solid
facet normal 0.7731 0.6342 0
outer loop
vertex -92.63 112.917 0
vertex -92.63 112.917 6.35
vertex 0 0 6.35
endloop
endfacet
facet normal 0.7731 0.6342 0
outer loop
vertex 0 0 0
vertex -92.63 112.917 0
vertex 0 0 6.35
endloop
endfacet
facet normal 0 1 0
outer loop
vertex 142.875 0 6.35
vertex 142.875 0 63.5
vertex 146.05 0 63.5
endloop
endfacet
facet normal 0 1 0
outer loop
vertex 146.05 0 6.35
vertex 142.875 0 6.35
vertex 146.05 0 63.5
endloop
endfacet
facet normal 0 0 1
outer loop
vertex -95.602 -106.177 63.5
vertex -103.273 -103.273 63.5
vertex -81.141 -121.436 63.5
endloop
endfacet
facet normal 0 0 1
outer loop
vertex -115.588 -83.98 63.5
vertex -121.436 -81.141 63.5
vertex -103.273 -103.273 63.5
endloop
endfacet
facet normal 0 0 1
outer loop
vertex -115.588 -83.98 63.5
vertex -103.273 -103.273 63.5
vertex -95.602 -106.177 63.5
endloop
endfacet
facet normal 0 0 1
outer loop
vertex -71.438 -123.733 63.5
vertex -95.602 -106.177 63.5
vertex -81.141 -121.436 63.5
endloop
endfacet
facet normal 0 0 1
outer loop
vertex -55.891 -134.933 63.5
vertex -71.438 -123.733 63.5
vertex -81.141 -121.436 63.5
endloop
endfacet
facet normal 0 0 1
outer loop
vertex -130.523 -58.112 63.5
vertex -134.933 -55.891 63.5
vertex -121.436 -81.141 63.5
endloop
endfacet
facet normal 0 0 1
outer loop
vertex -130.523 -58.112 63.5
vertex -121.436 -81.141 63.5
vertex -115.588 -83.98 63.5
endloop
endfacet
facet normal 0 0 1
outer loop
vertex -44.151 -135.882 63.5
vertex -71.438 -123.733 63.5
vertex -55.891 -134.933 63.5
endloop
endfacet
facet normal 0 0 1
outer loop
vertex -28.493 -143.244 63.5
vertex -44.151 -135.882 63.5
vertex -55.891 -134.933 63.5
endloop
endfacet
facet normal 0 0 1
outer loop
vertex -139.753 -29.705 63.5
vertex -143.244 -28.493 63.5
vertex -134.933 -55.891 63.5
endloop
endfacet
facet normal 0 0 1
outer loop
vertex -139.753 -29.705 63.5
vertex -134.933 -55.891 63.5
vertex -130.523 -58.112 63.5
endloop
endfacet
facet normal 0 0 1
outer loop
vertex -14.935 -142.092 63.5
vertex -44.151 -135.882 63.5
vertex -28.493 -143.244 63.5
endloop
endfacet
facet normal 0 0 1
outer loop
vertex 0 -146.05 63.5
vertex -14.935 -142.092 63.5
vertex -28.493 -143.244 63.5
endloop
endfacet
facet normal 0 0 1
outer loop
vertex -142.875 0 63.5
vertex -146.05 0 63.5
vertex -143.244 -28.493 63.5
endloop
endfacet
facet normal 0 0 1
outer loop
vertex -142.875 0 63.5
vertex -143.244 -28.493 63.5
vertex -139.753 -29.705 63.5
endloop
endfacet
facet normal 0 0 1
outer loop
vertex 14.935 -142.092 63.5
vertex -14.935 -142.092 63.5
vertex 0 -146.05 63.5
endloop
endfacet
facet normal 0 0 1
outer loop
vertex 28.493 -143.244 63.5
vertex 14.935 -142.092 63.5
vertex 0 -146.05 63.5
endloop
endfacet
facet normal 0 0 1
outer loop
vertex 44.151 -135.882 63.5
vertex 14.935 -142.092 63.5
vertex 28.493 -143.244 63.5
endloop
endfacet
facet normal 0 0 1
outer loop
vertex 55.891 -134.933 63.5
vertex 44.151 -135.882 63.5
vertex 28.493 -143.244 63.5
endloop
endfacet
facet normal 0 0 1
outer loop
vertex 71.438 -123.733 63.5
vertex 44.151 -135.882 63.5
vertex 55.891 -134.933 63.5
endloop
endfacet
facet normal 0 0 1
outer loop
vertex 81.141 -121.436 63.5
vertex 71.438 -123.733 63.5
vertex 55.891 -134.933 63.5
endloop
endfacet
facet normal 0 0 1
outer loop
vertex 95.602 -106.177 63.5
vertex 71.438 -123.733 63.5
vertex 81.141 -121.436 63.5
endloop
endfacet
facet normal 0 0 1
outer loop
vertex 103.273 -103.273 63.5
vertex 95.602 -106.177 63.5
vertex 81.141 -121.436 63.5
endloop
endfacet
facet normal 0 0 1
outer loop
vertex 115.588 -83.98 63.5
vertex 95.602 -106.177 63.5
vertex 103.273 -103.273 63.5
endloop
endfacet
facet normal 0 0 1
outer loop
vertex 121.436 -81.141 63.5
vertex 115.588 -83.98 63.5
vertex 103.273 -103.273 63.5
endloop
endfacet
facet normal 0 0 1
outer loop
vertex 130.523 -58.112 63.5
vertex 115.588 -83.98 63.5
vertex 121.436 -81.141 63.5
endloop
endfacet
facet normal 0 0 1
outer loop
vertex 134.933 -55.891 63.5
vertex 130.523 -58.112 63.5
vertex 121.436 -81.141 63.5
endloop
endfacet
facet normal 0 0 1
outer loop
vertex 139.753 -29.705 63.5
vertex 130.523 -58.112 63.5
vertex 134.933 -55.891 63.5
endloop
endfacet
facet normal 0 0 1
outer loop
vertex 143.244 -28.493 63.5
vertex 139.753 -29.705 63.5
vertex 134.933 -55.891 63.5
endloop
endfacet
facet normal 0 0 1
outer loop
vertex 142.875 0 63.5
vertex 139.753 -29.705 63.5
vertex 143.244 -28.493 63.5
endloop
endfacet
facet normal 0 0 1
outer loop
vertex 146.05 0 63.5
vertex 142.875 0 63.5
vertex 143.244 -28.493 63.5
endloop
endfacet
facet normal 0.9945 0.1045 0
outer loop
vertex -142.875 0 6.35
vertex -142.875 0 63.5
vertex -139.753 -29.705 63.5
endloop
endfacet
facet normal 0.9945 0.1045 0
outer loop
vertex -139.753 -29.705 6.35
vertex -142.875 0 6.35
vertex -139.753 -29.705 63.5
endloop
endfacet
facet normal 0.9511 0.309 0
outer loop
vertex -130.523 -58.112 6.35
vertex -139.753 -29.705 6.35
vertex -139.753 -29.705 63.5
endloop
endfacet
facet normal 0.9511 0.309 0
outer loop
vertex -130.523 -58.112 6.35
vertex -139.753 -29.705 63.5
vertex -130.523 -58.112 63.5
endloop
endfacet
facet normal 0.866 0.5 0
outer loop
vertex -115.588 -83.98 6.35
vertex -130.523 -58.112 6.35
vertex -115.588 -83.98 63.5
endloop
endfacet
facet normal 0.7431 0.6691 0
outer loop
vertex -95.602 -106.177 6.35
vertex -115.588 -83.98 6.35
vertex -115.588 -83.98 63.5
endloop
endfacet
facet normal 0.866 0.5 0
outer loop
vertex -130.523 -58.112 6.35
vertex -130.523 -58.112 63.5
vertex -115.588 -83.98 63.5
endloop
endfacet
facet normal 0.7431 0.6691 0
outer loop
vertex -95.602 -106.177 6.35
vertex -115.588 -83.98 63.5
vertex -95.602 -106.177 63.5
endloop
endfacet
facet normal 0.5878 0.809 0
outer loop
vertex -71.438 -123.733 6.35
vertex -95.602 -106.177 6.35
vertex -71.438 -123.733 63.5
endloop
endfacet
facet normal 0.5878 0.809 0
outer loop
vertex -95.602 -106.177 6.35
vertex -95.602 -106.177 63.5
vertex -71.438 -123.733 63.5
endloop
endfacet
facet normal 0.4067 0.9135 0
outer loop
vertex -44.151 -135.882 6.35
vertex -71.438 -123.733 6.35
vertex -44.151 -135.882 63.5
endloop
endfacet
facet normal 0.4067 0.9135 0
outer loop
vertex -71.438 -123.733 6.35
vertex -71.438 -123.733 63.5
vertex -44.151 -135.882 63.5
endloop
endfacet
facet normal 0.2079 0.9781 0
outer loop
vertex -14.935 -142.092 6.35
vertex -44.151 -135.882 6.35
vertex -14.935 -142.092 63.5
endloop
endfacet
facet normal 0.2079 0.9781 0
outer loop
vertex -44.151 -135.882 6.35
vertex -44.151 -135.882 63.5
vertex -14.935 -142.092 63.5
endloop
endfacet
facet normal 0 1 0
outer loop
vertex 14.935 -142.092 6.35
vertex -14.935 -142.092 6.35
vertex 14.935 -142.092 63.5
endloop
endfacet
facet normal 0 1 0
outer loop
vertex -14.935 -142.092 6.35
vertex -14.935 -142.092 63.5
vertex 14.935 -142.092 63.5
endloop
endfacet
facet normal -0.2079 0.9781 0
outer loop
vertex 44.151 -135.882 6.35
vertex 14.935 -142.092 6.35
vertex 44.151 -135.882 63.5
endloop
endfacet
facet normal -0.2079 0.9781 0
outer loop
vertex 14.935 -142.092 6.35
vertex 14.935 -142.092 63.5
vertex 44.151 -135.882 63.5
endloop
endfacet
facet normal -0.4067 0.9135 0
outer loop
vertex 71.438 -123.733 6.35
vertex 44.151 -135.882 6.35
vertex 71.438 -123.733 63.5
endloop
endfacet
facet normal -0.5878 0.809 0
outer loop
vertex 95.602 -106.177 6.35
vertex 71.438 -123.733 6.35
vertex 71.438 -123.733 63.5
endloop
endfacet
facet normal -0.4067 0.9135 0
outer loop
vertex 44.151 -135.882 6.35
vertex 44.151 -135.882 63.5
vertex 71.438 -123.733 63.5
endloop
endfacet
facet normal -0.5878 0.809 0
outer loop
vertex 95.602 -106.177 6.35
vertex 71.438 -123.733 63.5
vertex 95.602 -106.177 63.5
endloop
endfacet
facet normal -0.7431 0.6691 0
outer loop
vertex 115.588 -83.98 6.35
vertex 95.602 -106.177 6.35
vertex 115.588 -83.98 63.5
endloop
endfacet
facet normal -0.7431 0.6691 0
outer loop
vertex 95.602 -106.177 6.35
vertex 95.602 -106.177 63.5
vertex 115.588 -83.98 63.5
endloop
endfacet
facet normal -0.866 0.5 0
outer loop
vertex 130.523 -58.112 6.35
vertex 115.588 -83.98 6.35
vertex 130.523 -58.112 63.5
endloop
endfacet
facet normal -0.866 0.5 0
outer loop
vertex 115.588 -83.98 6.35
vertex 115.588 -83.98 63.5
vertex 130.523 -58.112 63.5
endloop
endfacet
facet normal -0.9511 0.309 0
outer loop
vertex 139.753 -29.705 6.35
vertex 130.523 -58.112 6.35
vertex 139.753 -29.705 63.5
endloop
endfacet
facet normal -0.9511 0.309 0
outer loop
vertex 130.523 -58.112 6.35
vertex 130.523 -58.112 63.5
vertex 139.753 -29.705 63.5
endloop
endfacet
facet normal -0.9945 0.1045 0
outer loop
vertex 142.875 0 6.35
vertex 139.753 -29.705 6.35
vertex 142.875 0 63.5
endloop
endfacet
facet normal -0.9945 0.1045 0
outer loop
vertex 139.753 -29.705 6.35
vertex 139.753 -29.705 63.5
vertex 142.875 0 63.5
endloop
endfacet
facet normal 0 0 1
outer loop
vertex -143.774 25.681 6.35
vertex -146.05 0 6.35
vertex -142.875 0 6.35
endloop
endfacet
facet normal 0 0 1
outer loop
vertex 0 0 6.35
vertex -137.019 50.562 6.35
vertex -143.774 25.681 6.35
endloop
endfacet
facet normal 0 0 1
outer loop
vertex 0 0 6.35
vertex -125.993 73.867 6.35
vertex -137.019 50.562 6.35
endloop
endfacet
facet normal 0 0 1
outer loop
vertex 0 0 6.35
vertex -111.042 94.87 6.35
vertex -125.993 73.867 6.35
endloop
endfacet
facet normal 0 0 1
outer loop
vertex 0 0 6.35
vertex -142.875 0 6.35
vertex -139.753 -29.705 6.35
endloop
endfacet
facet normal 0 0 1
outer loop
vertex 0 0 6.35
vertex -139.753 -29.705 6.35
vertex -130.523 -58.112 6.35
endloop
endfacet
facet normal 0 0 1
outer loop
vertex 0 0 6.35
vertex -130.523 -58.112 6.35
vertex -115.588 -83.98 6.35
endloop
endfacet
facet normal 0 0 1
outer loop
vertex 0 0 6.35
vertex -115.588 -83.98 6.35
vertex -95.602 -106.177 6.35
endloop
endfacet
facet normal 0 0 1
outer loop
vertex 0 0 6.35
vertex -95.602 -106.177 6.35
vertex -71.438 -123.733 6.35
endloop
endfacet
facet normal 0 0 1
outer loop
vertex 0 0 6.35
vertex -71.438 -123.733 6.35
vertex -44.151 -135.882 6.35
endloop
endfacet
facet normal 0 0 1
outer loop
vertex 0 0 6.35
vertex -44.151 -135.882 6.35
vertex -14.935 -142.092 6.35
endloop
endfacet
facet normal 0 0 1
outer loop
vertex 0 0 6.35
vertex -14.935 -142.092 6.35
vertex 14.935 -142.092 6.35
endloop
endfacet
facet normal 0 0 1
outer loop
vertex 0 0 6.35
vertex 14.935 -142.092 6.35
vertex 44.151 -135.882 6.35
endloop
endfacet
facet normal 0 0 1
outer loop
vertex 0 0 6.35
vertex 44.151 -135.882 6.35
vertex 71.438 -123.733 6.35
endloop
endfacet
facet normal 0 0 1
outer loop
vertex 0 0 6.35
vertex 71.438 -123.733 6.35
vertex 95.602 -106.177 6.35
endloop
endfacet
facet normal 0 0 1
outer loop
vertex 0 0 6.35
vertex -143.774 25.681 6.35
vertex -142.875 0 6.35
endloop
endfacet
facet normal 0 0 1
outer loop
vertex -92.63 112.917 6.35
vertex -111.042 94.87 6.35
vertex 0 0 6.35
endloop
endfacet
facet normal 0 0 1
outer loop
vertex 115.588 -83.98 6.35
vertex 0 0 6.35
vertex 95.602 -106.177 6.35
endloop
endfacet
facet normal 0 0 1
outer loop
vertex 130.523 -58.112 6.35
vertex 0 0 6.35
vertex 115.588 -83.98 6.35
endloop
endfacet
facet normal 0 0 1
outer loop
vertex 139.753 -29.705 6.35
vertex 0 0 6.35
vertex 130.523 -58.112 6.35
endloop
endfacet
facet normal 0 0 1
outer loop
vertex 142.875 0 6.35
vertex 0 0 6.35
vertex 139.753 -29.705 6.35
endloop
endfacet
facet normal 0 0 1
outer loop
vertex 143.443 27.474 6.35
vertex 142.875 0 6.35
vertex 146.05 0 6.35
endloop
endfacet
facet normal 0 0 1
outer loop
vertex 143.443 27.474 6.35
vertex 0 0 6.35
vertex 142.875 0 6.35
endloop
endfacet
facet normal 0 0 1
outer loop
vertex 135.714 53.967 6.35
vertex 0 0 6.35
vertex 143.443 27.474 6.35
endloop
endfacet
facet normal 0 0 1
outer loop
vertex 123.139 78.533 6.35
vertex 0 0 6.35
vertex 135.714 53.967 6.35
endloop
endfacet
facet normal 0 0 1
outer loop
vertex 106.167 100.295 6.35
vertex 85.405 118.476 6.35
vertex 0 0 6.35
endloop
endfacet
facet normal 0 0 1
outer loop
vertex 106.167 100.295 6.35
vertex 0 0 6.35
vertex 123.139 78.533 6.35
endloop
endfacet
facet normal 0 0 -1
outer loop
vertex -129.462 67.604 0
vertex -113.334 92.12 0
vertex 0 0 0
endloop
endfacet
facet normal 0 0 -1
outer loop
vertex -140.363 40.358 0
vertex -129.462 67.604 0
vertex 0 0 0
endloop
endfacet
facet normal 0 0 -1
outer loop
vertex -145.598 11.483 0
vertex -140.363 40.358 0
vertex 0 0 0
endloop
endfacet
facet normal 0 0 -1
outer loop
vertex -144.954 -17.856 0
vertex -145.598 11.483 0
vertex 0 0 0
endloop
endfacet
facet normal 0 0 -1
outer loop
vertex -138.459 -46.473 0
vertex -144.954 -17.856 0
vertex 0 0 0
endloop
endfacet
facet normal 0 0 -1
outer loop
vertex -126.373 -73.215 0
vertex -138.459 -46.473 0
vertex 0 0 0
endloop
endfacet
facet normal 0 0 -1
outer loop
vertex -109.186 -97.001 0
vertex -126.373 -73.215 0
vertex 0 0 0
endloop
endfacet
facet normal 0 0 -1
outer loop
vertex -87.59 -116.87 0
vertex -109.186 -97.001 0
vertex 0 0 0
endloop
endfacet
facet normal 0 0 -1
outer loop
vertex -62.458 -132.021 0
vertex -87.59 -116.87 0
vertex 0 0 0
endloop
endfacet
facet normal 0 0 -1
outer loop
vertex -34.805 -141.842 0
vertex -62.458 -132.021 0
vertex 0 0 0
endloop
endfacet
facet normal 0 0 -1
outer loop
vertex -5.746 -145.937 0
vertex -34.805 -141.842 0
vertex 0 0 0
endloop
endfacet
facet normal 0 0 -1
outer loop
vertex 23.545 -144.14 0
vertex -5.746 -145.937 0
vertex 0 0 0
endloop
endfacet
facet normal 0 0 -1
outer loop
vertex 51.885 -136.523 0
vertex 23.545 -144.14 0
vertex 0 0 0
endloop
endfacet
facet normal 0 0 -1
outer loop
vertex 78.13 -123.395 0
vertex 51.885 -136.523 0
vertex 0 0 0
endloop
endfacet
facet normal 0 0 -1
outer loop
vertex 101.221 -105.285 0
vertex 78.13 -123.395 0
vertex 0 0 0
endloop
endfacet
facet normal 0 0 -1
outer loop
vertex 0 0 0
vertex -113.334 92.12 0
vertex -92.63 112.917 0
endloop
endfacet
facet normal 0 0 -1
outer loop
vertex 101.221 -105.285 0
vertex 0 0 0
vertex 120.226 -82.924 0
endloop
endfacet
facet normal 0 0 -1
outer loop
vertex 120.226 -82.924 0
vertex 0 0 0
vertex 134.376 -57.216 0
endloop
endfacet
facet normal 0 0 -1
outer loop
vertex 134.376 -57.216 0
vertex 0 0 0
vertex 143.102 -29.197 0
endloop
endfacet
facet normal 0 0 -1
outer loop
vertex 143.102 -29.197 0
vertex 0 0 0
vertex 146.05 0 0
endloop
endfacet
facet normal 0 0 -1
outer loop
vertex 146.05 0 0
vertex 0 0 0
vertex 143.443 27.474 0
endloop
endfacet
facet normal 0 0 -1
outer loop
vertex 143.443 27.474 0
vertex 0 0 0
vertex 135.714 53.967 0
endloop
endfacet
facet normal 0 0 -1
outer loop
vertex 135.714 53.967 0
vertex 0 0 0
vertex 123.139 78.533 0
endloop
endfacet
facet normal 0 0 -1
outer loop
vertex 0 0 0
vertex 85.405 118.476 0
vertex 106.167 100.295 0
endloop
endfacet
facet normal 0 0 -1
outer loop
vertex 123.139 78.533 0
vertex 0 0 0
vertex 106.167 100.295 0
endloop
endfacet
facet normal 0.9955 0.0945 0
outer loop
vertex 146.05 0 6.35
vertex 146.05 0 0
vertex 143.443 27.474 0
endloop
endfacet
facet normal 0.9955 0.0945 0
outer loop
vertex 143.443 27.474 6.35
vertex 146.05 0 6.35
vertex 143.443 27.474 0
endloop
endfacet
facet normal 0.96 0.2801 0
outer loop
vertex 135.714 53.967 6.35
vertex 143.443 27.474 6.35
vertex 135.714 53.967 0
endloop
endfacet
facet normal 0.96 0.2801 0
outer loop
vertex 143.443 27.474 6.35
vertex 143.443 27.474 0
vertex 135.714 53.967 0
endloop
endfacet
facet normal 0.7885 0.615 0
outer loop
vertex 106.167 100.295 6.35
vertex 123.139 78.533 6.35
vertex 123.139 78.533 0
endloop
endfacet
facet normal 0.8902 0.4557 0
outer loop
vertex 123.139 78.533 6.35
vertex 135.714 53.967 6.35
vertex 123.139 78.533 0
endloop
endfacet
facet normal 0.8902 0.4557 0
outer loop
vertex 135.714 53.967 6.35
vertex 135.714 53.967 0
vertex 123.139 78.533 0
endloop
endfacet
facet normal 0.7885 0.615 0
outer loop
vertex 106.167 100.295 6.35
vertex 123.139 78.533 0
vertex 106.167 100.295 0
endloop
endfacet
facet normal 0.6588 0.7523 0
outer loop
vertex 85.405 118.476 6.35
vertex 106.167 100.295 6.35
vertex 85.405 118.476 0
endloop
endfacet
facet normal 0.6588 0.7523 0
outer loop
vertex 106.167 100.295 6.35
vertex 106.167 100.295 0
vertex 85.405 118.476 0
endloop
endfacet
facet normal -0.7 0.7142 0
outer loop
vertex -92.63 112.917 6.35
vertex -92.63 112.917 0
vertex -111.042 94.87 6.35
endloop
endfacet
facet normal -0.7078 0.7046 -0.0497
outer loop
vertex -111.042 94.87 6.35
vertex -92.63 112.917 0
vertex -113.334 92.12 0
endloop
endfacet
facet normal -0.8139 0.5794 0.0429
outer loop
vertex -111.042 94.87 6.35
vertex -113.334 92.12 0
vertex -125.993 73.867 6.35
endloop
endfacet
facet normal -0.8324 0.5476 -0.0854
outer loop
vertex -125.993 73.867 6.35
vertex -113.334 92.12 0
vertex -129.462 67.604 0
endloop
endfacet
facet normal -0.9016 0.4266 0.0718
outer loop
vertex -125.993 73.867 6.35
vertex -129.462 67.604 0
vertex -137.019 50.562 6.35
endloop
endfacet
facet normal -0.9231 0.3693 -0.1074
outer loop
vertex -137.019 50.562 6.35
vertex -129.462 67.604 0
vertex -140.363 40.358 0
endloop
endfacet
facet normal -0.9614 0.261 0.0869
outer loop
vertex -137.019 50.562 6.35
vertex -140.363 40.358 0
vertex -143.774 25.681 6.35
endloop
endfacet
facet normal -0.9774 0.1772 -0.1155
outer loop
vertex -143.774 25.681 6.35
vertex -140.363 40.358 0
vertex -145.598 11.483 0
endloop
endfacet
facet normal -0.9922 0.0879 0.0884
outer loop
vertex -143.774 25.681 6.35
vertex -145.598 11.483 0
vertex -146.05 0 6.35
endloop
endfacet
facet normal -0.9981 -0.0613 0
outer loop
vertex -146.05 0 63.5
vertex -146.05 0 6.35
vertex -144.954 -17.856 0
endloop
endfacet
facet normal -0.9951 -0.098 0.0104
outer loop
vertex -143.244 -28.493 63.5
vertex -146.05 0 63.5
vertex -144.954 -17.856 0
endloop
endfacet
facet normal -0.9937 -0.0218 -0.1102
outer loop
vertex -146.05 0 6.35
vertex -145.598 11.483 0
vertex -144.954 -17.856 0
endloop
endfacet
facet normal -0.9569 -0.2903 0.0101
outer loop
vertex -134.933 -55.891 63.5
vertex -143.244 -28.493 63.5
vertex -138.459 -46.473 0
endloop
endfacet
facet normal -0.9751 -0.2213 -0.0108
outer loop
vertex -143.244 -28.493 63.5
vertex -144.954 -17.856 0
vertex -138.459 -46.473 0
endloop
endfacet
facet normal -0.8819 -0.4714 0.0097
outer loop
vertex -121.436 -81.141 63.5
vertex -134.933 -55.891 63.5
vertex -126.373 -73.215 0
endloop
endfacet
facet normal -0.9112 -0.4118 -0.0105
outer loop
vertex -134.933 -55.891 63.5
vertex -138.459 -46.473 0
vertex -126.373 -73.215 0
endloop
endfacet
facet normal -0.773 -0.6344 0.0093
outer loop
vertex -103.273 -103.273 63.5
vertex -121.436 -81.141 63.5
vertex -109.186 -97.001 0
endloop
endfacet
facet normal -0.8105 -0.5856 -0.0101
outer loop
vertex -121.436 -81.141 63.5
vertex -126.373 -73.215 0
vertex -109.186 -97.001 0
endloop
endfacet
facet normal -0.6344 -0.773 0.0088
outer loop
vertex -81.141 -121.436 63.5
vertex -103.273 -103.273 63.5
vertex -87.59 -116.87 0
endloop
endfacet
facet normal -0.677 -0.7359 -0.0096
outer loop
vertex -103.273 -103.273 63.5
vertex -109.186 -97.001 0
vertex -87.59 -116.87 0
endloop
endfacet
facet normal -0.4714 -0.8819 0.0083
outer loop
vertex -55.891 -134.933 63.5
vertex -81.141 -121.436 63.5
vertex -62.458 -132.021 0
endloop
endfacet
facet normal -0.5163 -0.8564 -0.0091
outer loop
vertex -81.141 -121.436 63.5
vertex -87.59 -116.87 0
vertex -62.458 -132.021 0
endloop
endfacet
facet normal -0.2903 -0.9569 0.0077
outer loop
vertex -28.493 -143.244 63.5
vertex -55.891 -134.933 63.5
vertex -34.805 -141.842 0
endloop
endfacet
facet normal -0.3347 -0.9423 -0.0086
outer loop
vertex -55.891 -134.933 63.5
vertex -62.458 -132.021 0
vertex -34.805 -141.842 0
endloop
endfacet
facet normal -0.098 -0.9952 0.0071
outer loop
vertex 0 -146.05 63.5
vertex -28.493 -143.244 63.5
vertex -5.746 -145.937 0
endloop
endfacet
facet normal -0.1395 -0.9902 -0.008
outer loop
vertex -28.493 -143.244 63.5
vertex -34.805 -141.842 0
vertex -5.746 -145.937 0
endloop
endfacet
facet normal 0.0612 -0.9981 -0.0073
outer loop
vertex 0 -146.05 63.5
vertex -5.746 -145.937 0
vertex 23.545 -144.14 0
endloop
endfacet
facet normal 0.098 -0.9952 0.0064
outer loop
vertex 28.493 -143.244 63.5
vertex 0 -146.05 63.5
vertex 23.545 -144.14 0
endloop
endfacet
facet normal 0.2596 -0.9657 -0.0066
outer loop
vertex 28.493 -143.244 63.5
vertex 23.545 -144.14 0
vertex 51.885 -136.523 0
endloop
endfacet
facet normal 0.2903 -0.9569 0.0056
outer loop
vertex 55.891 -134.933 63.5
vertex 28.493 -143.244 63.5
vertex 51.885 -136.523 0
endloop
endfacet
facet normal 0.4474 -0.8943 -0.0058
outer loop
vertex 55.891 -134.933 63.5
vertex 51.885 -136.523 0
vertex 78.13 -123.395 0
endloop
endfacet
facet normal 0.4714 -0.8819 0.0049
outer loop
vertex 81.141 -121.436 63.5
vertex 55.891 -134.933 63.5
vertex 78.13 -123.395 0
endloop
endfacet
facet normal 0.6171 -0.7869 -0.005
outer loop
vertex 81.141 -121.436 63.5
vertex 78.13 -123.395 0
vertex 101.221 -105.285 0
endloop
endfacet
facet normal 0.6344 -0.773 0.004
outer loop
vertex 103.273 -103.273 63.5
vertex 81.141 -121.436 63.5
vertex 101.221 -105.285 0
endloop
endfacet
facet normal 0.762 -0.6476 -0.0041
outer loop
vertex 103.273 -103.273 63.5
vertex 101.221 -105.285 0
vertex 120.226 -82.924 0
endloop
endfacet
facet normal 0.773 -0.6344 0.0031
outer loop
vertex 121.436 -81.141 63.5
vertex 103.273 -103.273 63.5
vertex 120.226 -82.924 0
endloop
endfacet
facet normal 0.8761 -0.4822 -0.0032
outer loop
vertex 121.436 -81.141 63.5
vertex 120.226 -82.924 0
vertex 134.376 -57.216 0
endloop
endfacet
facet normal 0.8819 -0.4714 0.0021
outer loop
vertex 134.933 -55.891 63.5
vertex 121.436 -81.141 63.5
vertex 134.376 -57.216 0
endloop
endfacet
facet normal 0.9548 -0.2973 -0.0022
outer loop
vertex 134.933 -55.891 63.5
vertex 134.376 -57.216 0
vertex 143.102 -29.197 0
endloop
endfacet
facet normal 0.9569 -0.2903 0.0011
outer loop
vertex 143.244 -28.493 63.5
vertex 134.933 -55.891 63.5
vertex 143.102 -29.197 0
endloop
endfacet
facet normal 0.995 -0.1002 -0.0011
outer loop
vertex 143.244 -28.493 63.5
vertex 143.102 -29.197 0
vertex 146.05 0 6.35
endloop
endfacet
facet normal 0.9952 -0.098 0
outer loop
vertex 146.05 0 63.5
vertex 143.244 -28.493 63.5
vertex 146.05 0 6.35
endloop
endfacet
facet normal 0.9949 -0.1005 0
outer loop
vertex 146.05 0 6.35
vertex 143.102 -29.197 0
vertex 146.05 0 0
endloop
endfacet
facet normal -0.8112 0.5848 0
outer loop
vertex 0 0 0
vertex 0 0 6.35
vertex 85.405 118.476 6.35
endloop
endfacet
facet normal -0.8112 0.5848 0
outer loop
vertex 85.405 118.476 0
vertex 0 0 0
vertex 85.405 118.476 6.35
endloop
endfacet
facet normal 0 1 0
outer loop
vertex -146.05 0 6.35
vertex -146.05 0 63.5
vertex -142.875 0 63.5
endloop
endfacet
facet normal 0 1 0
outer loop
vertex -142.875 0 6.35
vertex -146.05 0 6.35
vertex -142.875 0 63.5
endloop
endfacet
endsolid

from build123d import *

# Parameters (mm, degrees)
F0_R     = 146.05
F1_DEPTH = 63.5
F2_R     = 142.875
F3_DEPTH = 57.15
F5_DEPTH = 57.15
F7_DEPTH = 63.501


with BuildPart() as f1:
    # F0 (on Top) → F1 (new body)
    with BuildSketch(Plane.XY):
        Circle(F0_R)
    extrude(amount=F1_DEPTH)

    # F2 (on face) → F3 (cut)
    with BuildSketch(Plane.XY.offset(63.5)):
        Circle(F2_R)
    extrude(amount=-F3_DEPTH, mode=Mode.SUBTRACT)

    # F4 (on face) → F5 (cut)
    with BuildSketch(Plane.XY.offset(63.5)):
        with BuildLine():
            Line((142.875, 0), (186.450183, 0))
            Line((186.450183, 0), (186.450183, 147.836223))
            Line((186.450183, 147.836223), (-190.863192, 147.836223))
            Line((-190.863192, 147.836223), (-190.863192, 0))
            Line((-190.863192, 0), (-142.875, 0))
            ThreePointArc((-142.875, 0), (0, 142.875), (142.875, 0))
        make_face()
    extrude(amount=-F5_DEPTH, mode=Mode.SUBTRACT)

    # F6 (on face) → F7 (cut, through all)
    with BuildSketch(Plane.XY.offset(63.5)):
        with BuildLine():
            Line((0, 0), (92.831509, 128.778389))
            ThreePointArc((92.831509, 128.778389), (-4.756055, 152.325769), (-100.68453, 122.736254))
            Line((-100.68453, 122.736254), (0, 0))
        make_face()
    extrude(amount=-F7_DEPTH, mode=Mode.SUBTRACT)


solid = f1.part
